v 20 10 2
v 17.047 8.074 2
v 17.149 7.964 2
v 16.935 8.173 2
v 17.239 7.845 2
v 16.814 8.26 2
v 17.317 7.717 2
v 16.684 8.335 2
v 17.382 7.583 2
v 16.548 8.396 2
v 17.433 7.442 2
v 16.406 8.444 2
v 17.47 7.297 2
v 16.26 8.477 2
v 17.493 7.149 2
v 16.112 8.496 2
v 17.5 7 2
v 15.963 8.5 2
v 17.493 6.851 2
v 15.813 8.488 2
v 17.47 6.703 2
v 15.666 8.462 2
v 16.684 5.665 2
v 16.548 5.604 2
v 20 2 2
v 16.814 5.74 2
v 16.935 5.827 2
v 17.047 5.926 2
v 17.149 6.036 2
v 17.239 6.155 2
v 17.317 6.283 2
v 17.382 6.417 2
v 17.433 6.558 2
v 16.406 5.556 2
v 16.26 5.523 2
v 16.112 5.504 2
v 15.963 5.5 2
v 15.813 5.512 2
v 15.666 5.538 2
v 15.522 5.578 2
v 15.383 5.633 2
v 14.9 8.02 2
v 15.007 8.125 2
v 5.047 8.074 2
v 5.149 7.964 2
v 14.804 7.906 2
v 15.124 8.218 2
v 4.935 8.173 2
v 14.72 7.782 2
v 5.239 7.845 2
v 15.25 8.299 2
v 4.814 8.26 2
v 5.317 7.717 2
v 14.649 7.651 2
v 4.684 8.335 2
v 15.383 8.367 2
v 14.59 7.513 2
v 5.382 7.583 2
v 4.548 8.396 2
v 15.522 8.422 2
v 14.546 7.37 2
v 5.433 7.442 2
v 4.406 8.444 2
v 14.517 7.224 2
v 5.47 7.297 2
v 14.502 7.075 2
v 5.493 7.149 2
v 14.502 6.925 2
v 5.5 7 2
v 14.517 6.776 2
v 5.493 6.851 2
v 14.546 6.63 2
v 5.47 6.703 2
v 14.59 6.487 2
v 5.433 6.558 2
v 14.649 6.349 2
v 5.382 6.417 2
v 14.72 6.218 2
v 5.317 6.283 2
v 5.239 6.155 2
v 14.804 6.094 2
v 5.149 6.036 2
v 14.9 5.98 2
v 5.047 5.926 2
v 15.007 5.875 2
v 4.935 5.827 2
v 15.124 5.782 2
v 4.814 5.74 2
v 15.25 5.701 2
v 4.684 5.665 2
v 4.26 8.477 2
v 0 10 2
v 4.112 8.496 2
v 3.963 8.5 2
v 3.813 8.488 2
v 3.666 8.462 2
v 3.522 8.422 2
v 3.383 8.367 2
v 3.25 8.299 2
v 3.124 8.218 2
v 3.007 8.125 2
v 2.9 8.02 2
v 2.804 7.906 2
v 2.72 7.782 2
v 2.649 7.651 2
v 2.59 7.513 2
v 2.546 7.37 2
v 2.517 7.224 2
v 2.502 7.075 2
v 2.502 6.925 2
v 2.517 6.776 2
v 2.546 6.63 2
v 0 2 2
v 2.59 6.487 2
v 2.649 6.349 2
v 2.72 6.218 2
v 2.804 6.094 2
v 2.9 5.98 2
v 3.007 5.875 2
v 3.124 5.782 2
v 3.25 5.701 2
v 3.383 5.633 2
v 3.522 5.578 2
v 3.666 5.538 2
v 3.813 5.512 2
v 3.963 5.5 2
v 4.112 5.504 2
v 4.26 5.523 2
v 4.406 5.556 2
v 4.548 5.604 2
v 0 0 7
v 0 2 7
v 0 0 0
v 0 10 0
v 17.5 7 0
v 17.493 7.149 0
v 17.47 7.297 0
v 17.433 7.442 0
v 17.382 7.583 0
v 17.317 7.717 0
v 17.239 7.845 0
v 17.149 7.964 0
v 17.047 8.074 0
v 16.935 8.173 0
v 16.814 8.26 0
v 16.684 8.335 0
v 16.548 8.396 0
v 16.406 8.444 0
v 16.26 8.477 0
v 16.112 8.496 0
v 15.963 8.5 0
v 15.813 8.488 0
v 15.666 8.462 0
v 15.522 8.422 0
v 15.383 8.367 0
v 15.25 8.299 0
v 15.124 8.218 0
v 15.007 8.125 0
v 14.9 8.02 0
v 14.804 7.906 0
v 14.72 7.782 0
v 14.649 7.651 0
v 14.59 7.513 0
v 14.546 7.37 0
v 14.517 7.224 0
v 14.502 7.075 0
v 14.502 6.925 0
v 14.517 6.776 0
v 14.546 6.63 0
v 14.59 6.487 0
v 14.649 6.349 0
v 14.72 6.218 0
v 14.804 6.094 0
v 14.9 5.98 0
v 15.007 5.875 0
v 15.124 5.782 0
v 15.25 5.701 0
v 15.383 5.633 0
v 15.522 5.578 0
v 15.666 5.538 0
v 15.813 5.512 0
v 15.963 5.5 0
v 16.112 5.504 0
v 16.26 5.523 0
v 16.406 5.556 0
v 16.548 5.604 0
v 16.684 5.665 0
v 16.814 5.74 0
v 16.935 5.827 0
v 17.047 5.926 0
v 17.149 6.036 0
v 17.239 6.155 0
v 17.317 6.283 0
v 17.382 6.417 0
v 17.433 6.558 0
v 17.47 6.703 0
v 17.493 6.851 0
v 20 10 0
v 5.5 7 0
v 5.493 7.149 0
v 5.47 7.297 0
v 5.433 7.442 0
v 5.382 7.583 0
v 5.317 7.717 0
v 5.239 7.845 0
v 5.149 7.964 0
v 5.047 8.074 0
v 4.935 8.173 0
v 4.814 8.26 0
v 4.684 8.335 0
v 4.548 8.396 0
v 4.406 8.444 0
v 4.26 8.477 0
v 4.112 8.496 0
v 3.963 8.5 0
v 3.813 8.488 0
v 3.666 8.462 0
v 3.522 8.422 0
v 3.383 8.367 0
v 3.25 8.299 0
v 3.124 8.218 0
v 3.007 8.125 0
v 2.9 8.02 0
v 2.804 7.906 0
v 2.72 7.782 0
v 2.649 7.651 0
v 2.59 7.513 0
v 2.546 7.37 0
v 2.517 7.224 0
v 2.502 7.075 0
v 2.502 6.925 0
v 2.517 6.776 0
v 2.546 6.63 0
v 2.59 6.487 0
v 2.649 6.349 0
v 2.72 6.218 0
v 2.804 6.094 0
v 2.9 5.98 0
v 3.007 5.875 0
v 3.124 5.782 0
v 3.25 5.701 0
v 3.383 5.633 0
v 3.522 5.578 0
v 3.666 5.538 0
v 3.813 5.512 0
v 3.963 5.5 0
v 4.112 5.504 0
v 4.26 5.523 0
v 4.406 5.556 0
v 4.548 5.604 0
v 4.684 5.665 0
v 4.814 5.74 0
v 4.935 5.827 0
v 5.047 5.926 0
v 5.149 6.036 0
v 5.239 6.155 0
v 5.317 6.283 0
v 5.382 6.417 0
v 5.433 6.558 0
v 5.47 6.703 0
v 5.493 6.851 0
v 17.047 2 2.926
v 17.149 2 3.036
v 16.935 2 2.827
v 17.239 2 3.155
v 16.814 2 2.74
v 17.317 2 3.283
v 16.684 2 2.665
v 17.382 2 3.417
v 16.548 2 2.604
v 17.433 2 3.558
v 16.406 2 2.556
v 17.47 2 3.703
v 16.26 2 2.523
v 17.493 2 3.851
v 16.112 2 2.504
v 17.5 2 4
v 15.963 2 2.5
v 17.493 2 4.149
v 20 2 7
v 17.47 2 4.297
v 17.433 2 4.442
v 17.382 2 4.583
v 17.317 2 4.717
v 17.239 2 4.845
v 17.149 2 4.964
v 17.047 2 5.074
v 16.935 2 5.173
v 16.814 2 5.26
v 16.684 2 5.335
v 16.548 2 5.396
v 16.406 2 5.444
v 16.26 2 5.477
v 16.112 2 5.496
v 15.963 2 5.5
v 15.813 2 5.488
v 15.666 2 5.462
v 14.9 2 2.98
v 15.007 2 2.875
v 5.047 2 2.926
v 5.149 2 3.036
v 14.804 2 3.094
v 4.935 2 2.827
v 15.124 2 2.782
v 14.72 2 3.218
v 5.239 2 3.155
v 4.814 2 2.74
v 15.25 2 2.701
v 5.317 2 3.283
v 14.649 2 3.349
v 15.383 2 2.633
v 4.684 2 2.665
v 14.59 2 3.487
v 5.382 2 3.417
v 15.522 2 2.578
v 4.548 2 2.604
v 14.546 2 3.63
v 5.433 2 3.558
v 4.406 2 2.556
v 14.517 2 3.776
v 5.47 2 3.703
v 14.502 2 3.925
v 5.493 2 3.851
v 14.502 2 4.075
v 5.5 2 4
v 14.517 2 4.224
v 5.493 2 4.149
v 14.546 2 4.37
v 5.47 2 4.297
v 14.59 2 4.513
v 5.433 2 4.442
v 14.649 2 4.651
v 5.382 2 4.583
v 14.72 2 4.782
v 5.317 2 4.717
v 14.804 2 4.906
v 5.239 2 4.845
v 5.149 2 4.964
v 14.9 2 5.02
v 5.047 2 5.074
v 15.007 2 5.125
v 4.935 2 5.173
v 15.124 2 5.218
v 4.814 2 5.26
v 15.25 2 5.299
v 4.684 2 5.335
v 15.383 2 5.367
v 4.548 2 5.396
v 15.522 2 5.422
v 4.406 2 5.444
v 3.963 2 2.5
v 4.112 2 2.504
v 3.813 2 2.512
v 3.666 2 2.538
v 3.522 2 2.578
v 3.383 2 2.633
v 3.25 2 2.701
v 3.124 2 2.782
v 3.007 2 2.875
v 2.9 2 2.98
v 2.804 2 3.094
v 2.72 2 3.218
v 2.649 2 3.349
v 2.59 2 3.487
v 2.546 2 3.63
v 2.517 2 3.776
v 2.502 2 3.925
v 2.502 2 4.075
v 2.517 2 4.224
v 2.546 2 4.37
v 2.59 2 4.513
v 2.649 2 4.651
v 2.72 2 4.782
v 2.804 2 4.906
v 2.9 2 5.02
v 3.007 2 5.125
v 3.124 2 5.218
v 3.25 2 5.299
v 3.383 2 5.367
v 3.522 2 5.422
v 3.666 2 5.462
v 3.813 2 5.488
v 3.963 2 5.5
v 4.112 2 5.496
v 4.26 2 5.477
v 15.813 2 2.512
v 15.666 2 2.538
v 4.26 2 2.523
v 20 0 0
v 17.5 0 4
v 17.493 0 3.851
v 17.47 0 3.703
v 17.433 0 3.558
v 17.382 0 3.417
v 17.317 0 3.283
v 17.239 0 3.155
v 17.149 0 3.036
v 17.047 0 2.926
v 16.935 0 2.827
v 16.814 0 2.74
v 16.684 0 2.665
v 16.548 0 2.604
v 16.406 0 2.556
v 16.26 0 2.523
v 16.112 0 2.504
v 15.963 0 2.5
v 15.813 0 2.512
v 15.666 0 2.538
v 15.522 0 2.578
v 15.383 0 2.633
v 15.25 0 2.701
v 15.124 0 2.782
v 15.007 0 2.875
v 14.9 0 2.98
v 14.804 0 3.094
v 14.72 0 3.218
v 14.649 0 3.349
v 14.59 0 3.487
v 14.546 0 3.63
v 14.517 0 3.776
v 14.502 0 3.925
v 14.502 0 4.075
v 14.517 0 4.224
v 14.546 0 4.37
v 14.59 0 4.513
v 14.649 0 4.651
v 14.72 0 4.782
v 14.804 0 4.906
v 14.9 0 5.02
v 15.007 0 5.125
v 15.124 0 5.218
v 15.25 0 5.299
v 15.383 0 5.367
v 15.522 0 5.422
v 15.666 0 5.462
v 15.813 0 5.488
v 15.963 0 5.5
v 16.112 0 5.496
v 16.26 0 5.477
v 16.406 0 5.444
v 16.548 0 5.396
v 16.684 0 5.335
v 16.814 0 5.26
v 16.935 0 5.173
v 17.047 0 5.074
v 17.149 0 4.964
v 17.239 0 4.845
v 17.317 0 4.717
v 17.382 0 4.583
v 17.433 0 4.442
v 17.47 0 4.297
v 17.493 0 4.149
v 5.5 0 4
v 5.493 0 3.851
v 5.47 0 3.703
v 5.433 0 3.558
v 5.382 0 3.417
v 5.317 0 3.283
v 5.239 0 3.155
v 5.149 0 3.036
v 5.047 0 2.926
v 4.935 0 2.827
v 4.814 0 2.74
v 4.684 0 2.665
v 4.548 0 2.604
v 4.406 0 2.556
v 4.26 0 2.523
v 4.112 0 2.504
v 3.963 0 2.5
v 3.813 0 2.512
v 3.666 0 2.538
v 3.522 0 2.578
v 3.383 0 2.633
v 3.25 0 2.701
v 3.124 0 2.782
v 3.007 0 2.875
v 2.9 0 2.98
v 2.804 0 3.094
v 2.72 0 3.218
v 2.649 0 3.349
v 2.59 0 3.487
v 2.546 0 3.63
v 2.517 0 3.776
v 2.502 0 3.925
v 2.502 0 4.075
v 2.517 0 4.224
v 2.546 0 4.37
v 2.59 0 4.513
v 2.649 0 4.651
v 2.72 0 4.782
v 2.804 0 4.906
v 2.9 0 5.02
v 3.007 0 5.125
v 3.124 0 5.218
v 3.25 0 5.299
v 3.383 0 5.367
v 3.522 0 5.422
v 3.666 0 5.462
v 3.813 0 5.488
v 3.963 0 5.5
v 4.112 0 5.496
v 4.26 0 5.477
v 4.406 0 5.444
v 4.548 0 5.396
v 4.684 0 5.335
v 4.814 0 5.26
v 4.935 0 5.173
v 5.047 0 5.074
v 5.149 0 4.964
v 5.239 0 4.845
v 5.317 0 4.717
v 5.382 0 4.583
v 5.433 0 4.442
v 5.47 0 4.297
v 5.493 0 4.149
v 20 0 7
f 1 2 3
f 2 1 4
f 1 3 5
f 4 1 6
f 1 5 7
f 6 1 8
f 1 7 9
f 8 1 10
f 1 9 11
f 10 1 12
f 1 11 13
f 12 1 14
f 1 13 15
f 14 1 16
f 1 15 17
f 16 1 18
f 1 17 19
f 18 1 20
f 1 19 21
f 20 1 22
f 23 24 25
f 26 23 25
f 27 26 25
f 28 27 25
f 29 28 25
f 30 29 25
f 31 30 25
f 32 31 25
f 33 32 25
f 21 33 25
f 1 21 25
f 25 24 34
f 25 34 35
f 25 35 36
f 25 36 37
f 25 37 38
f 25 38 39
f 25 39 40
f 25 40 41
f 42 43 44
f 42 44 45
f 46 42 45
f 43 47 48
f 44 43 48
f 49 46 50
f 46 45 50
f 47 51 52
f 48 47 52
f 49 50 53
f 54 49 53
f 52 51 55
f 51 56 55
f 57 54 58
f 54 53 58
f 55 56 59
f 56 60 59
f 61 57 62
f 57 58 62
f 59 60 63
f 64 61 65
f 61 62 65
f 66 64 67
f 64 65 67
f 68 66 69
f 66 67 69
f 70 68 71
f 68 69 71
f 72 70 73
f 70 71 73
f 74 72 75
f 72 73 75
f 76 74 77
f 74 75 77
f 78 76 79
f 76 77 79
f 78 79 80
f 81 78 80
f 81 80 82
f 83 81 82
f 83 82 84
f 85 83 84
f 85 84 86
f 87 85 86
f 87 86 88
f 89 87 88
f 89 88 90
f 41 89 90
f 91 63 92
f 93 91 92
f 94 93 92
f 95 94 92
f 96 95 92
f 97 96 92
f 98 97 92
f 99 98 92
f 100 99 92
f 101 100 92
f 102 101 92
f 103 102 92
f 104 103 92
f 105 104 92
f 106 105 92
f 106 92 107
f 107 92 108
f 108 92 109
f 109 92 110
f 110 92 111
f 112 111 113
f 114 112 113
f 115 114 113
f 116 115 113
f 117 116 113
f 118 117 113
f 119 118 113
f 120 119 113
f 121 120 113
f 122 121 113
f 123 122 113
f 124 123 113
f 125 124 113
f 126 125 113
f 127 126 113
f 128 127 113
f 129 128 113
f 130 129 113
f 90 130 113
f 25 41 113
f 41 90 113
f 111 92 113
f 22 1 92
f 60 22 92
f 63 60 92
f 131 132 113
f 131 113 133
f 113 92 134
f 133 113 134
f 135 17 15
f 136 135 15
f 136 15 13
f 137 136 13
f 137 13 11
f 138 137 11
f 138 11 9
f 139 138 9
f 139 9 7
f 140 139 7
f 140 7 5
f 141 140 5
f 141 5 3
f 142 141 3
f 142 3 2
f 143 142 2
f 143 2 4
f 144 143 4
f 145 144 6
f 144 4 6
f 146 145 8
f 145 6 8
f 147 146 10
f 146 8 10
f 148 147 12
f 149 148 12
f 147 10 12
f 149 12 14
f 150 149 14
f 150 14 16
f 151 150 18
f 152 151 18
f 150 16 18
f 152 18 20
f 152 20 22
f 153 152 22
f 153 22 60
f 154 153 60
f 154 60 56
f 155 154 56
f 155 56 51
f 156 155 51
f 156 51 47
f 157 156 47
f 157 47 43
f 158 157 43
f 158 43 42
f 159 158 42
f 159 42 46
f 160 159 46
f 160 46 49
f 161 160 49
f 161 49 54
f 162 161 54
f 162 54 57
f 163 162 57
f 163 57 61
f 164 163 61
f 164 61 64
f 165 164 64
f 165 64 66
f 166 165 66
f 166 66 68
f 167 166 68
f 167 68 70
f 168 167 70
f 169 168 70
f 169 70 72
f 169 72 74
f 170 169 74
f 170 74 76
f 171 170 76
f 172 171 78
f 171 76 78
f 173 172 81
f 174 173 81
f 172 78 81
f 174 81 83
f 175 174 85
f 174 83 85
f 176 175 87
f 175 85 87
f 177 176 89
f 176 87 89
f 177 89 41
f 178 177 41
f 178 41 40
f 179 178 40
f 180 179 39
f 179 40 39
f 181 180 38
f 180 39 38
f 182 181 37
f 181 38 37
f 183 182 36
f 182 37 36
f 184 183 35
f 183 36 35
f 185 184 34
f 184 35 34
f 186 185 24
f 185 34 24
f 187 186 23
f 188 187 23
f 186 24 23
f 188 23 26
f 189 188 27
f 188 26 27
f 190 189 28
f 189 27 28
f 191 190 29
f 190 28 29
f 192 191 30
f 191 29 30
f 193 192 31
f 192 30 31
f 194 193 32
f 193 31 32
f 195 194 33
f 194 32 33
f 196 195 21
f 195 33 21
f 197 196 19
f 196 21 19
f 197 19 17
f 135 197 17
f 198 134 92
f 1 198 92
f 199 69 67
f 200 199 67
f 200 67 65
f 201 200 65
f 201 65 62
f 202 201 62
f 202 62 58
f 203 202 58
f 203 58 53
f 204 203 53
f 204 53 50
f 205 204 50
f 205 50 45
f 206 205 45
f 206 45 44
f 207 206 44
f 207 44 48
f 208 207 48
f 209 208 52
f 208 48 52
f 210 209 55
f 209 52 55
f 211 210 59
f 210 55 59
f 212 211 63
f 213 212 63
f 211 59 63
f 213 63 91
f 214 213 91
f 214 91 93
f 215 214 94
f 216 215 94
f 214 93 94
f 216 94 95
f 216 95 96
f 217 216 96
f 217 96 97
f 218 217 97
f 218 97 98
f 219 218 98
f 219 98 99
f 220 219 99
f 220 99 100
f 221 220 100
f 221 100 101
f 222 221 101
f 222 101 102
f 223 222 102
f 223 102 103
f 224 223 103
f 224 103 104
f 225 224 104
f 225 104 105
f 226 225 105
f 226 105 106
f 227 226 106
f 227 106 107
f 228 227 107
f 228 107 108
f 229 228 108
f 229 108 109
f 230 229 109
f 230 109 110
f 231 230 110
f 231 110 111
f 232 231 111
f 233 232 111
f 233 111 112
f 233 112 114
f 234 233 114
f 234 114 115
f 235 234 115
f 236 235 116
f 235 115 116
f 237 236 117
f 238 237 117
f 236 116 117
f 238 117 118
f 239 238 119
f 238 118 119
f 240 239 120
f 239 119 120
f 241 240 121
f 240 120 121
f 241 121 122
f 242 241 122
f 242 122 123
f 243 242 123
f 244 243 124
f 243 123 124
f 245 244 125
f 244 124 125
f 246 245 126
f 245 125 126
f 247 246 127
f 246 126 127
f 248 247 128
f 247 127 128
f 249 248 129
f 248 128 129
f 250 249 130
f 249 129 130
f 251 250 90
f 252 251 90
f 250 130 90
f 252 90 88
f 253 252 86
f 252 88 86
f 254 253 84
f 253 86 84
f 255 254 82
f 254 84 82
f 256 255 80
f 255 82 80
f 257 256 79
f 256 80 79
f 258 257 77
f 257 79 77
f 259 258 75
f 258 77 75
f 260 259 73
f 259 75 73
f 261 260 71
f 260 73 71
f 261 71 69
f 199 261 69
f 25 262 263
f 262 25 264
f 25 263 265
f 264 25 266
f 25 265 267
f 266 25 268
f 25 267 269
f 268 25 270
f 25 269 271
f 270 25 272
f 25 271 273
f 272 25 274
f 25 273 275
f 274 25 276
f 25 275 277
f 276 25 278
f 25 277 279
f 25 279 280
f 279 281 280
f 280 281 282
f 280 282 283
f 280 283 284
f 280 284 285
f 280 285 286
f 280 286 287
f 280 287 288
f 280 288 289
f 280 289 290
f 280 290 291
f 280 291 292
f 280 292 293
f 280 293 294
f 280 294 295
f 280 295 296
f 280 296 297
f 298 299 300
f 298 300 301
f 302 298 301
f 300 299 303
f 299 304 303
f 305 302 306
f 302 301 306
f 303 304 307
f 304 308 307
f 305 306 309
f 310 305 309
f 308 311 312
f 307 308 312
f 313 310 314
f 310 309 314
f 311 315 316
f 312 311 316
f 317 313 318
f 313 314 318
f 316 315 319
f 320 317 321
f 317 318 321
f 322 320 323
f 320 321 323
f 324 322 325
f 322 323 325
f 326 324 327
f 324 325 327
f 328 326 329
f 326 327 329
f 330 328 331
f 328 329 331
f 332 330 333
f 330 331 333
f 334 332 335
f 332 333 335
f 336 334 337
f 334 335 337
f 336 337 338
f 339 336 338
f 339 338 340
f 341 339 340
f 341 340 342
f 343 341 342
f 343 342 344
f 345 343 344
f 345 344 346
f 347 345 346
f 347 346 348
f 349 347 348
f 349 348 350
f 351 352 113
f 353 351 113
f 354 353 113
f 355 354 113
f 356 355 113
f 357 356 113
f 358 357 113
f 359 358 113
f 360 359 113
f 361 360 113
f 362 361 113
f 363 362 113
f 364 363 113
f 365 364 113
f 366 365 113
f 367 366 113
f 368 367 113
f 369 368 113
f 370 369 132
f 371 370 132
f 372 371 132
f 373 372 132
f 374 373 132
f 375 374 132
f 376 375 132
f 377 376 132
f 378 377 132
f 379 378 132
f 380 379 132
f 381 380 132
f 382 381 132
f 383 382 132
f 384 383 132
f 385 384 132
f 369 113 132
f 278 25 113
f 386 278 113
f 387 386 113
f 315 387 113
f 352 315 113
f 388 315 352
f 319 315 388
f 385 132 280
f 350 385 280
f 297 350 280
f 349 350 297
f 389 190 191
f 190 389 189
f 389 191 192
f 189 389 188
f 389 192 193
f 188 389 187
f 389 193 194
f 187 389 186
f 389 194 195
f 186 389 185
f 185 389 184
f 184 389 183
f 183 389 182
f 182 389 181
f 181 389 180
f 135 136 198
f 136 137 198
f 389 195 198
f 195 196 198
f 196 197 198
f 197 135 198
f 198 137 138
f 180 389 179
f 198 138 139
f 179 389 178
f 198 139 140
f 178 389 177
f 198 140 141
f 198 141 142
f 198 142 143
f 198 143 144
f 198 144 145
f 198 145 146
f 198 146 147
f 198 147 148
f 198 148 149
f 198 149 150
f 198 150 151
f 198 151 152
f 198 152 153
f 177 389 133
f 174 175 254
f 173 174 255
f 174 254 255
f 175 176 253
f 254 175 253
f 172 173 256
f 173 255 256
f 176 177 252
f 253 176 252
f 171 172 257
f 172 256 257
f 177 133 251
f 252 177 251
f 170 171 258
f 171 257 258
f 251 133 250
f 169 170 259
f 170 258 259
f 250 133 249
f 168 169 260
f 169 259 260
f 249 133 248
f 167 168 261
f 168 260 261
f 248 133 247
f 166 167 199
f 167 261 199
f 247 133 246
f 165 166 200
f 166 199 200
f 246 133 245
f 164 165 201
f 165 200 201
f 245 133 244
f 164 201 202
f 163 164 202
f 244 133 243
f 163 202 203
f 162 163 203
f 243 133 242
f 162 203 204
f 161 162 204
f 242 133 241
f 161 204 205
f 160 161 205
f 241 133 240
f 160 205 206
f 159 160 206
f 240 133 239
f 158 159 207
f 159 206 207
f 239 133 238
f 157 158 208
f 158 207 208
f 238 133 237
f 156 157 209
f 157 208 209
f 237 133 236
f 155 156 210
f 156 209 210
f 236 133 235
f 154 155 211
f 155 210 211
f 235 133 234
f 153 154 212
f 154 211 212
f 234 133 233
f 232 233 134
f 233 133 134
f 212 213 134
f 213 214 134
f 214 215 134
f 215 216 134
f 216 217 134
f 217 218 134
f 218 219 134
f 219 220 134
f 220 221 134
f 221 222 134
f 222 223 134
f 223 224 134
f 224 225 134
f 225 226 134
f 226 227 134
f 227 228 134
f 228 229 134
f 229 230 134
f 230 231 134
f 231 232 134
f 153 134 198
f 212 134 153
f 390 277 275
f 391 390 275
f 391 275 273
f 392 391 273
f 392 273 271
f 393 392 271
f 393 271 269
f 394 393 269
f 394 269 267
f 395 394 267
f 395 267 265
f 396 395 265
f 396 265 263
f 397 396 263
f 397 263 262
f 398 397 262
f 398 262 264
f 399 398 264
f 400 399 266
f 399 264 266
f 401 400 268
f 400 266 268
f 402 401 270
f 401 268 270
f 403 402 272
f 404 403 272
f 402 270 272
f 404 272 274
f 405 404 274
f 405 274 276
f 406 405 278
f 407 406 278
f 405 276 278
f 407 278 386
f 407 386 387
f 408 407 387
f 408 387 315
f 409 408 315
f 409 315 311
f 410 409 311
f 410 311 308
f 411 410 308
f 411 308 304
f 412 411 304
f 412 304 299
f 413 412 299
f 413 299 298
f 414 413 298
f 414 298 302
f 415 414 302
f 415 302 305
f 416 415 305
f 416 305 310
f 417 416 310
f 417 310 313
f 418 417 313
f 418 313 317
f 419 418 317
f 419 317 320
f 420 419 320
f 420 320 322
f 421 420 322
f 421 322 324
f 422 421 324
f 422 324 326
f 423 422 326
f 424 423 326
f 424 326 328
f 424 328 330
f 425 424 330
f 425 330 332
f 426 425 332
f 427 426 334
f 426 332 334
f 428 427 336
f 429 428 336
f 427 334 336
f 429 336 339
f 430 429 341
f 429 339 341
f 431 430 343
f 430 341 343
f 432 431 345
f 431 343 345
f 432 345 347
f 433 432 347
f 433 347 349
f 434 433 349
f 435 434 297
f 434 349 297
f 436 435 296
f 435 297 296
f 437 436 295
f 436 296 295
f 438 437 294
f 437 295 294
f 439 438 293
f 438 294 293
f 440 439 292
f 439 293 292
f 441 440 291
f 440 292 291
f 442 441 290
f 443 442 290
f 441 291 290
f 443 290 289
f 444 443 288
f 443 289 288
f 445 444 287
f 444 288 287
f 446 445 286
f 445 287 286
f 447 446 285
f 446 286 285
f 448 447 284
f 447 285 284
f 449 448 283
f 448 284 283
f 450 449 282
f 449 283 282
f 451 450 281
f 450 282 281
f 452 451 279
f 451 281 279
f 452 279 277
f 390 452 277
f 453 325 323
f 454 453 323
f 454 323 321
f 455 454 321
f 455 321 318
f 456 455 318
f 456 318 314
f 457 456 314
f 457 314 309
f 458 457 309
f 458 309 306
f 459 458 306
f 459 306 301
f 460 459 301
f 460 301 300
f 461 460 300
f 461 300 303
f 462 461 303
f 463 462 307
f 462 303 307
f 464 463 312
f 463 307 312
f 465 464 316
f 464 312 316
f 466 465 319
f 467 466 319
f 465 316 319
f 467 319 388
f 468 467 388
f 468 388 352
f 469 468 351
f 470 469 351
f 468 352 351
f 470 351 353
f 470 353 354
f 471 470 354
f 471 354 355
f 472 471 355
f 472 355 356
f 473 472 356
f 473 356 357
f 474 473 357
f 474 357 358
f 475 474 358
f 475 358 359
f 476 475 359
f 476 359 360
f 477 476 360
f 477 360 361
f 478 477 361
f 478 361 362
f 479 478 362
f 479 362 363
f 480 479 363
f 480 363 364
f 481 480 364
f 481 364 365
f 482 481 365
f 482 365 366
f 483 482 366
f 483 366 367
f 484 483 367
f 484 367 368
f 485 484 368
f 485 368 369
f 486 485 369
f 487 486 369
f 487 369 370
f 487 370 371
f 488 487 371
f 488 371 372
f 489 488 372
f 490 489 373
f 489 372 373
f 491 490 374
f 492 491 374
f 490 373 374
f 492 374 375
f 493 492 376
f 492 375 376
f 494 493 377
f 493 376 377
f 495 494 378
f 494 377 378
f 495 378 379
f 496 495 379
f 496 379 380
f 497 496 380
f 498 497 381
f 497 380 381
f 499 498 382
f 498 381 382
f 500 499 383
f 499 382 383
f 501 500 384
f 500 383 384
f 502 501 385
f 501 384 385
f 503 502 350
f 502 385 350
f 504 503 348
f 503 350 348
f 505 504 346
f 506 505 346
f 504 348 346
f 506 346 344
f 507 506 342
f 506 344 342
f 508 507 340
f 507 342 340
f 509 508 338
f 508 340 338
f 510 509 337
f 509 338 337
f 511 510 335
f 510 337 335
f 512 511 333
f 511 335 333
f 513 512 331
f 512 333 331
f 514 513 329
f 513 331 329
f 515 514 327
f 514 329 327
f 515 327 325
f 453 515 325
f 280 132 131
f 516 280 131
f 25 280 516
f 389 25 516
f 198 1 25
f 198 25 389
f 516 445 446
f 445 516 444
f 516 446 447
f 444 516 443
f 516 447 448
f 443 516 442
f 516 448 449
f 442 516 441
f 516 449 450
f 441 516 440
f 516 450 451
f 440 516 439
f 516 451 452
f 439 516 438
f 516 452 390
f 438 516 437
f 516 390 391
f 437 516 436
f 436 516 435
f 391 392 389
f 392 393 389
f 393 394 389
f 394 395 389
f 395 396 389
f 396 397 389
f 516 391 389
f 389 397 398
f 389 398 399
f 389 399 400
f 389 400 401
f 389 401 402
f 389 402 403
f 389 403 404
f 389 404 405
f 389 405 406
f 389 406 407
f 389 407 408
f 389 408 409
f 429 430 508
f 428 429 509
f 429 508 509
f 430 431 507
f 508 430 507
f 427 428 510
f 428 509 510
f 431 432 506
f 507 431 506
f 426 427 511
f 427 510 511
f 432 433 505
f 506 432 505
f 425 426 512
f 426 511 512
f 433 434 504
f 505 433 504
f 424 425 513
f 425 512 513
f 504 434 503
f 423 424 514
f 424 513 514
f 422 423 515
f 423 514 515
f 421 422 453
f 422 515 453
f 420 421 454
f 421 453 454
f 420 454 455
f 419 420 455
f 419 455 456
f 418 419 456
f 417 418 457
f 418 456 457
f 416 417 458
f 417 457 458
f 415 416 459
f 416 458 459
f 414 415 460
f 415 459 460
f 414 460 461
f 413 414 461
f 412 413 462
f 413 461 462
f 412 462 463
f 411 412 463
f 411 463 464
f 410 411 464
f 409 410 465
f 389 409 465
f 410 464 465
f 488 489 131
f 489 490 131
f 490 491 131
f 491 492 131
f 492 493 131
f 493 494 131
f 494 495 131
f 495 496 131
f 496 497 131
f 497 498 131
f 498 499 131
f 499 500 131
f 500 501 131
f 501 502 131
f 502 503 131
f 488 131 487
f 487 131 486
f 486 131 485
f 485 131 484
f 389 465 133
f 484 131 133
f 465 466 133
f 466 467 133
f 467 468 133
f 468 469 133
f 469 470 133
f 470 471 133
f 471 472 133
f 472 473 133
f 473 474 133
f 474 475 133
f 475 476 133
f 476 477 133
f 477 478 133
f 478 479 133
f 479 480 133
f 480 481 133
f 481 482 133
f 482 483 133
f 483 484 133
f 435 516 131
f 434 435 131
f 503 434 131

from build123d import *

# Parameters (mm, degrees)
RESSALTO_EXTRUS_O1_DEPTH = 20
ESBO_O2_R                = 1.5
CORTE_EXTRUS_O1_DEPTH    = 3
ESBO_O3_R                = 1.5
CORTE_EXTRUS_O2_DEPTH    = 3


with BuildPart() as part:
    # Esboço1 → Ressalto-extrusão1 (new body)
    with BuildSketch(Plane(origin=(0, 0, 0), x_dir=(0, 0, -1), z_dir=(1, 0, 0))):
        Polygon((0, 0), (0, 10), (-2, 10), (-2, 2), (-7, 2), (-7, 0), align=None)
    extrude(amount=RESSALTO_EXTRUS_O1_DEPTH)

    # Esboço2 → Corte-extrusão1 (cut, through all)
    with BuildSketch(Plane(origin=(0, 2, 0), x_dir=(1, 0, 0), z_dir=(0, 1, 0))):
        with Locations((4, -4)):
            Circle(ESBO_O2_R)
        with Locations((16, -4)):
            Circle(ESBO_O2_R)
    extrude(amount=-CORTE_EXTRUS_O1_DEPTH, mode=Mode.SUBTRACT)

    # Esboço3 → Corte-extrusão2 (cut, through all)
    with BuildSketch(Plane.XY.offset(2)):
        with Locations((4, 7)):
            Circle(ESBO_O3_R)
        with Locations((16, 7)):
            Circle(ESBO_O3_R)
    extrude(amount=-CORTE_EXTRUS_O2_DEPTH, mode=Mode.SUBTRACT)


solid = part.part
